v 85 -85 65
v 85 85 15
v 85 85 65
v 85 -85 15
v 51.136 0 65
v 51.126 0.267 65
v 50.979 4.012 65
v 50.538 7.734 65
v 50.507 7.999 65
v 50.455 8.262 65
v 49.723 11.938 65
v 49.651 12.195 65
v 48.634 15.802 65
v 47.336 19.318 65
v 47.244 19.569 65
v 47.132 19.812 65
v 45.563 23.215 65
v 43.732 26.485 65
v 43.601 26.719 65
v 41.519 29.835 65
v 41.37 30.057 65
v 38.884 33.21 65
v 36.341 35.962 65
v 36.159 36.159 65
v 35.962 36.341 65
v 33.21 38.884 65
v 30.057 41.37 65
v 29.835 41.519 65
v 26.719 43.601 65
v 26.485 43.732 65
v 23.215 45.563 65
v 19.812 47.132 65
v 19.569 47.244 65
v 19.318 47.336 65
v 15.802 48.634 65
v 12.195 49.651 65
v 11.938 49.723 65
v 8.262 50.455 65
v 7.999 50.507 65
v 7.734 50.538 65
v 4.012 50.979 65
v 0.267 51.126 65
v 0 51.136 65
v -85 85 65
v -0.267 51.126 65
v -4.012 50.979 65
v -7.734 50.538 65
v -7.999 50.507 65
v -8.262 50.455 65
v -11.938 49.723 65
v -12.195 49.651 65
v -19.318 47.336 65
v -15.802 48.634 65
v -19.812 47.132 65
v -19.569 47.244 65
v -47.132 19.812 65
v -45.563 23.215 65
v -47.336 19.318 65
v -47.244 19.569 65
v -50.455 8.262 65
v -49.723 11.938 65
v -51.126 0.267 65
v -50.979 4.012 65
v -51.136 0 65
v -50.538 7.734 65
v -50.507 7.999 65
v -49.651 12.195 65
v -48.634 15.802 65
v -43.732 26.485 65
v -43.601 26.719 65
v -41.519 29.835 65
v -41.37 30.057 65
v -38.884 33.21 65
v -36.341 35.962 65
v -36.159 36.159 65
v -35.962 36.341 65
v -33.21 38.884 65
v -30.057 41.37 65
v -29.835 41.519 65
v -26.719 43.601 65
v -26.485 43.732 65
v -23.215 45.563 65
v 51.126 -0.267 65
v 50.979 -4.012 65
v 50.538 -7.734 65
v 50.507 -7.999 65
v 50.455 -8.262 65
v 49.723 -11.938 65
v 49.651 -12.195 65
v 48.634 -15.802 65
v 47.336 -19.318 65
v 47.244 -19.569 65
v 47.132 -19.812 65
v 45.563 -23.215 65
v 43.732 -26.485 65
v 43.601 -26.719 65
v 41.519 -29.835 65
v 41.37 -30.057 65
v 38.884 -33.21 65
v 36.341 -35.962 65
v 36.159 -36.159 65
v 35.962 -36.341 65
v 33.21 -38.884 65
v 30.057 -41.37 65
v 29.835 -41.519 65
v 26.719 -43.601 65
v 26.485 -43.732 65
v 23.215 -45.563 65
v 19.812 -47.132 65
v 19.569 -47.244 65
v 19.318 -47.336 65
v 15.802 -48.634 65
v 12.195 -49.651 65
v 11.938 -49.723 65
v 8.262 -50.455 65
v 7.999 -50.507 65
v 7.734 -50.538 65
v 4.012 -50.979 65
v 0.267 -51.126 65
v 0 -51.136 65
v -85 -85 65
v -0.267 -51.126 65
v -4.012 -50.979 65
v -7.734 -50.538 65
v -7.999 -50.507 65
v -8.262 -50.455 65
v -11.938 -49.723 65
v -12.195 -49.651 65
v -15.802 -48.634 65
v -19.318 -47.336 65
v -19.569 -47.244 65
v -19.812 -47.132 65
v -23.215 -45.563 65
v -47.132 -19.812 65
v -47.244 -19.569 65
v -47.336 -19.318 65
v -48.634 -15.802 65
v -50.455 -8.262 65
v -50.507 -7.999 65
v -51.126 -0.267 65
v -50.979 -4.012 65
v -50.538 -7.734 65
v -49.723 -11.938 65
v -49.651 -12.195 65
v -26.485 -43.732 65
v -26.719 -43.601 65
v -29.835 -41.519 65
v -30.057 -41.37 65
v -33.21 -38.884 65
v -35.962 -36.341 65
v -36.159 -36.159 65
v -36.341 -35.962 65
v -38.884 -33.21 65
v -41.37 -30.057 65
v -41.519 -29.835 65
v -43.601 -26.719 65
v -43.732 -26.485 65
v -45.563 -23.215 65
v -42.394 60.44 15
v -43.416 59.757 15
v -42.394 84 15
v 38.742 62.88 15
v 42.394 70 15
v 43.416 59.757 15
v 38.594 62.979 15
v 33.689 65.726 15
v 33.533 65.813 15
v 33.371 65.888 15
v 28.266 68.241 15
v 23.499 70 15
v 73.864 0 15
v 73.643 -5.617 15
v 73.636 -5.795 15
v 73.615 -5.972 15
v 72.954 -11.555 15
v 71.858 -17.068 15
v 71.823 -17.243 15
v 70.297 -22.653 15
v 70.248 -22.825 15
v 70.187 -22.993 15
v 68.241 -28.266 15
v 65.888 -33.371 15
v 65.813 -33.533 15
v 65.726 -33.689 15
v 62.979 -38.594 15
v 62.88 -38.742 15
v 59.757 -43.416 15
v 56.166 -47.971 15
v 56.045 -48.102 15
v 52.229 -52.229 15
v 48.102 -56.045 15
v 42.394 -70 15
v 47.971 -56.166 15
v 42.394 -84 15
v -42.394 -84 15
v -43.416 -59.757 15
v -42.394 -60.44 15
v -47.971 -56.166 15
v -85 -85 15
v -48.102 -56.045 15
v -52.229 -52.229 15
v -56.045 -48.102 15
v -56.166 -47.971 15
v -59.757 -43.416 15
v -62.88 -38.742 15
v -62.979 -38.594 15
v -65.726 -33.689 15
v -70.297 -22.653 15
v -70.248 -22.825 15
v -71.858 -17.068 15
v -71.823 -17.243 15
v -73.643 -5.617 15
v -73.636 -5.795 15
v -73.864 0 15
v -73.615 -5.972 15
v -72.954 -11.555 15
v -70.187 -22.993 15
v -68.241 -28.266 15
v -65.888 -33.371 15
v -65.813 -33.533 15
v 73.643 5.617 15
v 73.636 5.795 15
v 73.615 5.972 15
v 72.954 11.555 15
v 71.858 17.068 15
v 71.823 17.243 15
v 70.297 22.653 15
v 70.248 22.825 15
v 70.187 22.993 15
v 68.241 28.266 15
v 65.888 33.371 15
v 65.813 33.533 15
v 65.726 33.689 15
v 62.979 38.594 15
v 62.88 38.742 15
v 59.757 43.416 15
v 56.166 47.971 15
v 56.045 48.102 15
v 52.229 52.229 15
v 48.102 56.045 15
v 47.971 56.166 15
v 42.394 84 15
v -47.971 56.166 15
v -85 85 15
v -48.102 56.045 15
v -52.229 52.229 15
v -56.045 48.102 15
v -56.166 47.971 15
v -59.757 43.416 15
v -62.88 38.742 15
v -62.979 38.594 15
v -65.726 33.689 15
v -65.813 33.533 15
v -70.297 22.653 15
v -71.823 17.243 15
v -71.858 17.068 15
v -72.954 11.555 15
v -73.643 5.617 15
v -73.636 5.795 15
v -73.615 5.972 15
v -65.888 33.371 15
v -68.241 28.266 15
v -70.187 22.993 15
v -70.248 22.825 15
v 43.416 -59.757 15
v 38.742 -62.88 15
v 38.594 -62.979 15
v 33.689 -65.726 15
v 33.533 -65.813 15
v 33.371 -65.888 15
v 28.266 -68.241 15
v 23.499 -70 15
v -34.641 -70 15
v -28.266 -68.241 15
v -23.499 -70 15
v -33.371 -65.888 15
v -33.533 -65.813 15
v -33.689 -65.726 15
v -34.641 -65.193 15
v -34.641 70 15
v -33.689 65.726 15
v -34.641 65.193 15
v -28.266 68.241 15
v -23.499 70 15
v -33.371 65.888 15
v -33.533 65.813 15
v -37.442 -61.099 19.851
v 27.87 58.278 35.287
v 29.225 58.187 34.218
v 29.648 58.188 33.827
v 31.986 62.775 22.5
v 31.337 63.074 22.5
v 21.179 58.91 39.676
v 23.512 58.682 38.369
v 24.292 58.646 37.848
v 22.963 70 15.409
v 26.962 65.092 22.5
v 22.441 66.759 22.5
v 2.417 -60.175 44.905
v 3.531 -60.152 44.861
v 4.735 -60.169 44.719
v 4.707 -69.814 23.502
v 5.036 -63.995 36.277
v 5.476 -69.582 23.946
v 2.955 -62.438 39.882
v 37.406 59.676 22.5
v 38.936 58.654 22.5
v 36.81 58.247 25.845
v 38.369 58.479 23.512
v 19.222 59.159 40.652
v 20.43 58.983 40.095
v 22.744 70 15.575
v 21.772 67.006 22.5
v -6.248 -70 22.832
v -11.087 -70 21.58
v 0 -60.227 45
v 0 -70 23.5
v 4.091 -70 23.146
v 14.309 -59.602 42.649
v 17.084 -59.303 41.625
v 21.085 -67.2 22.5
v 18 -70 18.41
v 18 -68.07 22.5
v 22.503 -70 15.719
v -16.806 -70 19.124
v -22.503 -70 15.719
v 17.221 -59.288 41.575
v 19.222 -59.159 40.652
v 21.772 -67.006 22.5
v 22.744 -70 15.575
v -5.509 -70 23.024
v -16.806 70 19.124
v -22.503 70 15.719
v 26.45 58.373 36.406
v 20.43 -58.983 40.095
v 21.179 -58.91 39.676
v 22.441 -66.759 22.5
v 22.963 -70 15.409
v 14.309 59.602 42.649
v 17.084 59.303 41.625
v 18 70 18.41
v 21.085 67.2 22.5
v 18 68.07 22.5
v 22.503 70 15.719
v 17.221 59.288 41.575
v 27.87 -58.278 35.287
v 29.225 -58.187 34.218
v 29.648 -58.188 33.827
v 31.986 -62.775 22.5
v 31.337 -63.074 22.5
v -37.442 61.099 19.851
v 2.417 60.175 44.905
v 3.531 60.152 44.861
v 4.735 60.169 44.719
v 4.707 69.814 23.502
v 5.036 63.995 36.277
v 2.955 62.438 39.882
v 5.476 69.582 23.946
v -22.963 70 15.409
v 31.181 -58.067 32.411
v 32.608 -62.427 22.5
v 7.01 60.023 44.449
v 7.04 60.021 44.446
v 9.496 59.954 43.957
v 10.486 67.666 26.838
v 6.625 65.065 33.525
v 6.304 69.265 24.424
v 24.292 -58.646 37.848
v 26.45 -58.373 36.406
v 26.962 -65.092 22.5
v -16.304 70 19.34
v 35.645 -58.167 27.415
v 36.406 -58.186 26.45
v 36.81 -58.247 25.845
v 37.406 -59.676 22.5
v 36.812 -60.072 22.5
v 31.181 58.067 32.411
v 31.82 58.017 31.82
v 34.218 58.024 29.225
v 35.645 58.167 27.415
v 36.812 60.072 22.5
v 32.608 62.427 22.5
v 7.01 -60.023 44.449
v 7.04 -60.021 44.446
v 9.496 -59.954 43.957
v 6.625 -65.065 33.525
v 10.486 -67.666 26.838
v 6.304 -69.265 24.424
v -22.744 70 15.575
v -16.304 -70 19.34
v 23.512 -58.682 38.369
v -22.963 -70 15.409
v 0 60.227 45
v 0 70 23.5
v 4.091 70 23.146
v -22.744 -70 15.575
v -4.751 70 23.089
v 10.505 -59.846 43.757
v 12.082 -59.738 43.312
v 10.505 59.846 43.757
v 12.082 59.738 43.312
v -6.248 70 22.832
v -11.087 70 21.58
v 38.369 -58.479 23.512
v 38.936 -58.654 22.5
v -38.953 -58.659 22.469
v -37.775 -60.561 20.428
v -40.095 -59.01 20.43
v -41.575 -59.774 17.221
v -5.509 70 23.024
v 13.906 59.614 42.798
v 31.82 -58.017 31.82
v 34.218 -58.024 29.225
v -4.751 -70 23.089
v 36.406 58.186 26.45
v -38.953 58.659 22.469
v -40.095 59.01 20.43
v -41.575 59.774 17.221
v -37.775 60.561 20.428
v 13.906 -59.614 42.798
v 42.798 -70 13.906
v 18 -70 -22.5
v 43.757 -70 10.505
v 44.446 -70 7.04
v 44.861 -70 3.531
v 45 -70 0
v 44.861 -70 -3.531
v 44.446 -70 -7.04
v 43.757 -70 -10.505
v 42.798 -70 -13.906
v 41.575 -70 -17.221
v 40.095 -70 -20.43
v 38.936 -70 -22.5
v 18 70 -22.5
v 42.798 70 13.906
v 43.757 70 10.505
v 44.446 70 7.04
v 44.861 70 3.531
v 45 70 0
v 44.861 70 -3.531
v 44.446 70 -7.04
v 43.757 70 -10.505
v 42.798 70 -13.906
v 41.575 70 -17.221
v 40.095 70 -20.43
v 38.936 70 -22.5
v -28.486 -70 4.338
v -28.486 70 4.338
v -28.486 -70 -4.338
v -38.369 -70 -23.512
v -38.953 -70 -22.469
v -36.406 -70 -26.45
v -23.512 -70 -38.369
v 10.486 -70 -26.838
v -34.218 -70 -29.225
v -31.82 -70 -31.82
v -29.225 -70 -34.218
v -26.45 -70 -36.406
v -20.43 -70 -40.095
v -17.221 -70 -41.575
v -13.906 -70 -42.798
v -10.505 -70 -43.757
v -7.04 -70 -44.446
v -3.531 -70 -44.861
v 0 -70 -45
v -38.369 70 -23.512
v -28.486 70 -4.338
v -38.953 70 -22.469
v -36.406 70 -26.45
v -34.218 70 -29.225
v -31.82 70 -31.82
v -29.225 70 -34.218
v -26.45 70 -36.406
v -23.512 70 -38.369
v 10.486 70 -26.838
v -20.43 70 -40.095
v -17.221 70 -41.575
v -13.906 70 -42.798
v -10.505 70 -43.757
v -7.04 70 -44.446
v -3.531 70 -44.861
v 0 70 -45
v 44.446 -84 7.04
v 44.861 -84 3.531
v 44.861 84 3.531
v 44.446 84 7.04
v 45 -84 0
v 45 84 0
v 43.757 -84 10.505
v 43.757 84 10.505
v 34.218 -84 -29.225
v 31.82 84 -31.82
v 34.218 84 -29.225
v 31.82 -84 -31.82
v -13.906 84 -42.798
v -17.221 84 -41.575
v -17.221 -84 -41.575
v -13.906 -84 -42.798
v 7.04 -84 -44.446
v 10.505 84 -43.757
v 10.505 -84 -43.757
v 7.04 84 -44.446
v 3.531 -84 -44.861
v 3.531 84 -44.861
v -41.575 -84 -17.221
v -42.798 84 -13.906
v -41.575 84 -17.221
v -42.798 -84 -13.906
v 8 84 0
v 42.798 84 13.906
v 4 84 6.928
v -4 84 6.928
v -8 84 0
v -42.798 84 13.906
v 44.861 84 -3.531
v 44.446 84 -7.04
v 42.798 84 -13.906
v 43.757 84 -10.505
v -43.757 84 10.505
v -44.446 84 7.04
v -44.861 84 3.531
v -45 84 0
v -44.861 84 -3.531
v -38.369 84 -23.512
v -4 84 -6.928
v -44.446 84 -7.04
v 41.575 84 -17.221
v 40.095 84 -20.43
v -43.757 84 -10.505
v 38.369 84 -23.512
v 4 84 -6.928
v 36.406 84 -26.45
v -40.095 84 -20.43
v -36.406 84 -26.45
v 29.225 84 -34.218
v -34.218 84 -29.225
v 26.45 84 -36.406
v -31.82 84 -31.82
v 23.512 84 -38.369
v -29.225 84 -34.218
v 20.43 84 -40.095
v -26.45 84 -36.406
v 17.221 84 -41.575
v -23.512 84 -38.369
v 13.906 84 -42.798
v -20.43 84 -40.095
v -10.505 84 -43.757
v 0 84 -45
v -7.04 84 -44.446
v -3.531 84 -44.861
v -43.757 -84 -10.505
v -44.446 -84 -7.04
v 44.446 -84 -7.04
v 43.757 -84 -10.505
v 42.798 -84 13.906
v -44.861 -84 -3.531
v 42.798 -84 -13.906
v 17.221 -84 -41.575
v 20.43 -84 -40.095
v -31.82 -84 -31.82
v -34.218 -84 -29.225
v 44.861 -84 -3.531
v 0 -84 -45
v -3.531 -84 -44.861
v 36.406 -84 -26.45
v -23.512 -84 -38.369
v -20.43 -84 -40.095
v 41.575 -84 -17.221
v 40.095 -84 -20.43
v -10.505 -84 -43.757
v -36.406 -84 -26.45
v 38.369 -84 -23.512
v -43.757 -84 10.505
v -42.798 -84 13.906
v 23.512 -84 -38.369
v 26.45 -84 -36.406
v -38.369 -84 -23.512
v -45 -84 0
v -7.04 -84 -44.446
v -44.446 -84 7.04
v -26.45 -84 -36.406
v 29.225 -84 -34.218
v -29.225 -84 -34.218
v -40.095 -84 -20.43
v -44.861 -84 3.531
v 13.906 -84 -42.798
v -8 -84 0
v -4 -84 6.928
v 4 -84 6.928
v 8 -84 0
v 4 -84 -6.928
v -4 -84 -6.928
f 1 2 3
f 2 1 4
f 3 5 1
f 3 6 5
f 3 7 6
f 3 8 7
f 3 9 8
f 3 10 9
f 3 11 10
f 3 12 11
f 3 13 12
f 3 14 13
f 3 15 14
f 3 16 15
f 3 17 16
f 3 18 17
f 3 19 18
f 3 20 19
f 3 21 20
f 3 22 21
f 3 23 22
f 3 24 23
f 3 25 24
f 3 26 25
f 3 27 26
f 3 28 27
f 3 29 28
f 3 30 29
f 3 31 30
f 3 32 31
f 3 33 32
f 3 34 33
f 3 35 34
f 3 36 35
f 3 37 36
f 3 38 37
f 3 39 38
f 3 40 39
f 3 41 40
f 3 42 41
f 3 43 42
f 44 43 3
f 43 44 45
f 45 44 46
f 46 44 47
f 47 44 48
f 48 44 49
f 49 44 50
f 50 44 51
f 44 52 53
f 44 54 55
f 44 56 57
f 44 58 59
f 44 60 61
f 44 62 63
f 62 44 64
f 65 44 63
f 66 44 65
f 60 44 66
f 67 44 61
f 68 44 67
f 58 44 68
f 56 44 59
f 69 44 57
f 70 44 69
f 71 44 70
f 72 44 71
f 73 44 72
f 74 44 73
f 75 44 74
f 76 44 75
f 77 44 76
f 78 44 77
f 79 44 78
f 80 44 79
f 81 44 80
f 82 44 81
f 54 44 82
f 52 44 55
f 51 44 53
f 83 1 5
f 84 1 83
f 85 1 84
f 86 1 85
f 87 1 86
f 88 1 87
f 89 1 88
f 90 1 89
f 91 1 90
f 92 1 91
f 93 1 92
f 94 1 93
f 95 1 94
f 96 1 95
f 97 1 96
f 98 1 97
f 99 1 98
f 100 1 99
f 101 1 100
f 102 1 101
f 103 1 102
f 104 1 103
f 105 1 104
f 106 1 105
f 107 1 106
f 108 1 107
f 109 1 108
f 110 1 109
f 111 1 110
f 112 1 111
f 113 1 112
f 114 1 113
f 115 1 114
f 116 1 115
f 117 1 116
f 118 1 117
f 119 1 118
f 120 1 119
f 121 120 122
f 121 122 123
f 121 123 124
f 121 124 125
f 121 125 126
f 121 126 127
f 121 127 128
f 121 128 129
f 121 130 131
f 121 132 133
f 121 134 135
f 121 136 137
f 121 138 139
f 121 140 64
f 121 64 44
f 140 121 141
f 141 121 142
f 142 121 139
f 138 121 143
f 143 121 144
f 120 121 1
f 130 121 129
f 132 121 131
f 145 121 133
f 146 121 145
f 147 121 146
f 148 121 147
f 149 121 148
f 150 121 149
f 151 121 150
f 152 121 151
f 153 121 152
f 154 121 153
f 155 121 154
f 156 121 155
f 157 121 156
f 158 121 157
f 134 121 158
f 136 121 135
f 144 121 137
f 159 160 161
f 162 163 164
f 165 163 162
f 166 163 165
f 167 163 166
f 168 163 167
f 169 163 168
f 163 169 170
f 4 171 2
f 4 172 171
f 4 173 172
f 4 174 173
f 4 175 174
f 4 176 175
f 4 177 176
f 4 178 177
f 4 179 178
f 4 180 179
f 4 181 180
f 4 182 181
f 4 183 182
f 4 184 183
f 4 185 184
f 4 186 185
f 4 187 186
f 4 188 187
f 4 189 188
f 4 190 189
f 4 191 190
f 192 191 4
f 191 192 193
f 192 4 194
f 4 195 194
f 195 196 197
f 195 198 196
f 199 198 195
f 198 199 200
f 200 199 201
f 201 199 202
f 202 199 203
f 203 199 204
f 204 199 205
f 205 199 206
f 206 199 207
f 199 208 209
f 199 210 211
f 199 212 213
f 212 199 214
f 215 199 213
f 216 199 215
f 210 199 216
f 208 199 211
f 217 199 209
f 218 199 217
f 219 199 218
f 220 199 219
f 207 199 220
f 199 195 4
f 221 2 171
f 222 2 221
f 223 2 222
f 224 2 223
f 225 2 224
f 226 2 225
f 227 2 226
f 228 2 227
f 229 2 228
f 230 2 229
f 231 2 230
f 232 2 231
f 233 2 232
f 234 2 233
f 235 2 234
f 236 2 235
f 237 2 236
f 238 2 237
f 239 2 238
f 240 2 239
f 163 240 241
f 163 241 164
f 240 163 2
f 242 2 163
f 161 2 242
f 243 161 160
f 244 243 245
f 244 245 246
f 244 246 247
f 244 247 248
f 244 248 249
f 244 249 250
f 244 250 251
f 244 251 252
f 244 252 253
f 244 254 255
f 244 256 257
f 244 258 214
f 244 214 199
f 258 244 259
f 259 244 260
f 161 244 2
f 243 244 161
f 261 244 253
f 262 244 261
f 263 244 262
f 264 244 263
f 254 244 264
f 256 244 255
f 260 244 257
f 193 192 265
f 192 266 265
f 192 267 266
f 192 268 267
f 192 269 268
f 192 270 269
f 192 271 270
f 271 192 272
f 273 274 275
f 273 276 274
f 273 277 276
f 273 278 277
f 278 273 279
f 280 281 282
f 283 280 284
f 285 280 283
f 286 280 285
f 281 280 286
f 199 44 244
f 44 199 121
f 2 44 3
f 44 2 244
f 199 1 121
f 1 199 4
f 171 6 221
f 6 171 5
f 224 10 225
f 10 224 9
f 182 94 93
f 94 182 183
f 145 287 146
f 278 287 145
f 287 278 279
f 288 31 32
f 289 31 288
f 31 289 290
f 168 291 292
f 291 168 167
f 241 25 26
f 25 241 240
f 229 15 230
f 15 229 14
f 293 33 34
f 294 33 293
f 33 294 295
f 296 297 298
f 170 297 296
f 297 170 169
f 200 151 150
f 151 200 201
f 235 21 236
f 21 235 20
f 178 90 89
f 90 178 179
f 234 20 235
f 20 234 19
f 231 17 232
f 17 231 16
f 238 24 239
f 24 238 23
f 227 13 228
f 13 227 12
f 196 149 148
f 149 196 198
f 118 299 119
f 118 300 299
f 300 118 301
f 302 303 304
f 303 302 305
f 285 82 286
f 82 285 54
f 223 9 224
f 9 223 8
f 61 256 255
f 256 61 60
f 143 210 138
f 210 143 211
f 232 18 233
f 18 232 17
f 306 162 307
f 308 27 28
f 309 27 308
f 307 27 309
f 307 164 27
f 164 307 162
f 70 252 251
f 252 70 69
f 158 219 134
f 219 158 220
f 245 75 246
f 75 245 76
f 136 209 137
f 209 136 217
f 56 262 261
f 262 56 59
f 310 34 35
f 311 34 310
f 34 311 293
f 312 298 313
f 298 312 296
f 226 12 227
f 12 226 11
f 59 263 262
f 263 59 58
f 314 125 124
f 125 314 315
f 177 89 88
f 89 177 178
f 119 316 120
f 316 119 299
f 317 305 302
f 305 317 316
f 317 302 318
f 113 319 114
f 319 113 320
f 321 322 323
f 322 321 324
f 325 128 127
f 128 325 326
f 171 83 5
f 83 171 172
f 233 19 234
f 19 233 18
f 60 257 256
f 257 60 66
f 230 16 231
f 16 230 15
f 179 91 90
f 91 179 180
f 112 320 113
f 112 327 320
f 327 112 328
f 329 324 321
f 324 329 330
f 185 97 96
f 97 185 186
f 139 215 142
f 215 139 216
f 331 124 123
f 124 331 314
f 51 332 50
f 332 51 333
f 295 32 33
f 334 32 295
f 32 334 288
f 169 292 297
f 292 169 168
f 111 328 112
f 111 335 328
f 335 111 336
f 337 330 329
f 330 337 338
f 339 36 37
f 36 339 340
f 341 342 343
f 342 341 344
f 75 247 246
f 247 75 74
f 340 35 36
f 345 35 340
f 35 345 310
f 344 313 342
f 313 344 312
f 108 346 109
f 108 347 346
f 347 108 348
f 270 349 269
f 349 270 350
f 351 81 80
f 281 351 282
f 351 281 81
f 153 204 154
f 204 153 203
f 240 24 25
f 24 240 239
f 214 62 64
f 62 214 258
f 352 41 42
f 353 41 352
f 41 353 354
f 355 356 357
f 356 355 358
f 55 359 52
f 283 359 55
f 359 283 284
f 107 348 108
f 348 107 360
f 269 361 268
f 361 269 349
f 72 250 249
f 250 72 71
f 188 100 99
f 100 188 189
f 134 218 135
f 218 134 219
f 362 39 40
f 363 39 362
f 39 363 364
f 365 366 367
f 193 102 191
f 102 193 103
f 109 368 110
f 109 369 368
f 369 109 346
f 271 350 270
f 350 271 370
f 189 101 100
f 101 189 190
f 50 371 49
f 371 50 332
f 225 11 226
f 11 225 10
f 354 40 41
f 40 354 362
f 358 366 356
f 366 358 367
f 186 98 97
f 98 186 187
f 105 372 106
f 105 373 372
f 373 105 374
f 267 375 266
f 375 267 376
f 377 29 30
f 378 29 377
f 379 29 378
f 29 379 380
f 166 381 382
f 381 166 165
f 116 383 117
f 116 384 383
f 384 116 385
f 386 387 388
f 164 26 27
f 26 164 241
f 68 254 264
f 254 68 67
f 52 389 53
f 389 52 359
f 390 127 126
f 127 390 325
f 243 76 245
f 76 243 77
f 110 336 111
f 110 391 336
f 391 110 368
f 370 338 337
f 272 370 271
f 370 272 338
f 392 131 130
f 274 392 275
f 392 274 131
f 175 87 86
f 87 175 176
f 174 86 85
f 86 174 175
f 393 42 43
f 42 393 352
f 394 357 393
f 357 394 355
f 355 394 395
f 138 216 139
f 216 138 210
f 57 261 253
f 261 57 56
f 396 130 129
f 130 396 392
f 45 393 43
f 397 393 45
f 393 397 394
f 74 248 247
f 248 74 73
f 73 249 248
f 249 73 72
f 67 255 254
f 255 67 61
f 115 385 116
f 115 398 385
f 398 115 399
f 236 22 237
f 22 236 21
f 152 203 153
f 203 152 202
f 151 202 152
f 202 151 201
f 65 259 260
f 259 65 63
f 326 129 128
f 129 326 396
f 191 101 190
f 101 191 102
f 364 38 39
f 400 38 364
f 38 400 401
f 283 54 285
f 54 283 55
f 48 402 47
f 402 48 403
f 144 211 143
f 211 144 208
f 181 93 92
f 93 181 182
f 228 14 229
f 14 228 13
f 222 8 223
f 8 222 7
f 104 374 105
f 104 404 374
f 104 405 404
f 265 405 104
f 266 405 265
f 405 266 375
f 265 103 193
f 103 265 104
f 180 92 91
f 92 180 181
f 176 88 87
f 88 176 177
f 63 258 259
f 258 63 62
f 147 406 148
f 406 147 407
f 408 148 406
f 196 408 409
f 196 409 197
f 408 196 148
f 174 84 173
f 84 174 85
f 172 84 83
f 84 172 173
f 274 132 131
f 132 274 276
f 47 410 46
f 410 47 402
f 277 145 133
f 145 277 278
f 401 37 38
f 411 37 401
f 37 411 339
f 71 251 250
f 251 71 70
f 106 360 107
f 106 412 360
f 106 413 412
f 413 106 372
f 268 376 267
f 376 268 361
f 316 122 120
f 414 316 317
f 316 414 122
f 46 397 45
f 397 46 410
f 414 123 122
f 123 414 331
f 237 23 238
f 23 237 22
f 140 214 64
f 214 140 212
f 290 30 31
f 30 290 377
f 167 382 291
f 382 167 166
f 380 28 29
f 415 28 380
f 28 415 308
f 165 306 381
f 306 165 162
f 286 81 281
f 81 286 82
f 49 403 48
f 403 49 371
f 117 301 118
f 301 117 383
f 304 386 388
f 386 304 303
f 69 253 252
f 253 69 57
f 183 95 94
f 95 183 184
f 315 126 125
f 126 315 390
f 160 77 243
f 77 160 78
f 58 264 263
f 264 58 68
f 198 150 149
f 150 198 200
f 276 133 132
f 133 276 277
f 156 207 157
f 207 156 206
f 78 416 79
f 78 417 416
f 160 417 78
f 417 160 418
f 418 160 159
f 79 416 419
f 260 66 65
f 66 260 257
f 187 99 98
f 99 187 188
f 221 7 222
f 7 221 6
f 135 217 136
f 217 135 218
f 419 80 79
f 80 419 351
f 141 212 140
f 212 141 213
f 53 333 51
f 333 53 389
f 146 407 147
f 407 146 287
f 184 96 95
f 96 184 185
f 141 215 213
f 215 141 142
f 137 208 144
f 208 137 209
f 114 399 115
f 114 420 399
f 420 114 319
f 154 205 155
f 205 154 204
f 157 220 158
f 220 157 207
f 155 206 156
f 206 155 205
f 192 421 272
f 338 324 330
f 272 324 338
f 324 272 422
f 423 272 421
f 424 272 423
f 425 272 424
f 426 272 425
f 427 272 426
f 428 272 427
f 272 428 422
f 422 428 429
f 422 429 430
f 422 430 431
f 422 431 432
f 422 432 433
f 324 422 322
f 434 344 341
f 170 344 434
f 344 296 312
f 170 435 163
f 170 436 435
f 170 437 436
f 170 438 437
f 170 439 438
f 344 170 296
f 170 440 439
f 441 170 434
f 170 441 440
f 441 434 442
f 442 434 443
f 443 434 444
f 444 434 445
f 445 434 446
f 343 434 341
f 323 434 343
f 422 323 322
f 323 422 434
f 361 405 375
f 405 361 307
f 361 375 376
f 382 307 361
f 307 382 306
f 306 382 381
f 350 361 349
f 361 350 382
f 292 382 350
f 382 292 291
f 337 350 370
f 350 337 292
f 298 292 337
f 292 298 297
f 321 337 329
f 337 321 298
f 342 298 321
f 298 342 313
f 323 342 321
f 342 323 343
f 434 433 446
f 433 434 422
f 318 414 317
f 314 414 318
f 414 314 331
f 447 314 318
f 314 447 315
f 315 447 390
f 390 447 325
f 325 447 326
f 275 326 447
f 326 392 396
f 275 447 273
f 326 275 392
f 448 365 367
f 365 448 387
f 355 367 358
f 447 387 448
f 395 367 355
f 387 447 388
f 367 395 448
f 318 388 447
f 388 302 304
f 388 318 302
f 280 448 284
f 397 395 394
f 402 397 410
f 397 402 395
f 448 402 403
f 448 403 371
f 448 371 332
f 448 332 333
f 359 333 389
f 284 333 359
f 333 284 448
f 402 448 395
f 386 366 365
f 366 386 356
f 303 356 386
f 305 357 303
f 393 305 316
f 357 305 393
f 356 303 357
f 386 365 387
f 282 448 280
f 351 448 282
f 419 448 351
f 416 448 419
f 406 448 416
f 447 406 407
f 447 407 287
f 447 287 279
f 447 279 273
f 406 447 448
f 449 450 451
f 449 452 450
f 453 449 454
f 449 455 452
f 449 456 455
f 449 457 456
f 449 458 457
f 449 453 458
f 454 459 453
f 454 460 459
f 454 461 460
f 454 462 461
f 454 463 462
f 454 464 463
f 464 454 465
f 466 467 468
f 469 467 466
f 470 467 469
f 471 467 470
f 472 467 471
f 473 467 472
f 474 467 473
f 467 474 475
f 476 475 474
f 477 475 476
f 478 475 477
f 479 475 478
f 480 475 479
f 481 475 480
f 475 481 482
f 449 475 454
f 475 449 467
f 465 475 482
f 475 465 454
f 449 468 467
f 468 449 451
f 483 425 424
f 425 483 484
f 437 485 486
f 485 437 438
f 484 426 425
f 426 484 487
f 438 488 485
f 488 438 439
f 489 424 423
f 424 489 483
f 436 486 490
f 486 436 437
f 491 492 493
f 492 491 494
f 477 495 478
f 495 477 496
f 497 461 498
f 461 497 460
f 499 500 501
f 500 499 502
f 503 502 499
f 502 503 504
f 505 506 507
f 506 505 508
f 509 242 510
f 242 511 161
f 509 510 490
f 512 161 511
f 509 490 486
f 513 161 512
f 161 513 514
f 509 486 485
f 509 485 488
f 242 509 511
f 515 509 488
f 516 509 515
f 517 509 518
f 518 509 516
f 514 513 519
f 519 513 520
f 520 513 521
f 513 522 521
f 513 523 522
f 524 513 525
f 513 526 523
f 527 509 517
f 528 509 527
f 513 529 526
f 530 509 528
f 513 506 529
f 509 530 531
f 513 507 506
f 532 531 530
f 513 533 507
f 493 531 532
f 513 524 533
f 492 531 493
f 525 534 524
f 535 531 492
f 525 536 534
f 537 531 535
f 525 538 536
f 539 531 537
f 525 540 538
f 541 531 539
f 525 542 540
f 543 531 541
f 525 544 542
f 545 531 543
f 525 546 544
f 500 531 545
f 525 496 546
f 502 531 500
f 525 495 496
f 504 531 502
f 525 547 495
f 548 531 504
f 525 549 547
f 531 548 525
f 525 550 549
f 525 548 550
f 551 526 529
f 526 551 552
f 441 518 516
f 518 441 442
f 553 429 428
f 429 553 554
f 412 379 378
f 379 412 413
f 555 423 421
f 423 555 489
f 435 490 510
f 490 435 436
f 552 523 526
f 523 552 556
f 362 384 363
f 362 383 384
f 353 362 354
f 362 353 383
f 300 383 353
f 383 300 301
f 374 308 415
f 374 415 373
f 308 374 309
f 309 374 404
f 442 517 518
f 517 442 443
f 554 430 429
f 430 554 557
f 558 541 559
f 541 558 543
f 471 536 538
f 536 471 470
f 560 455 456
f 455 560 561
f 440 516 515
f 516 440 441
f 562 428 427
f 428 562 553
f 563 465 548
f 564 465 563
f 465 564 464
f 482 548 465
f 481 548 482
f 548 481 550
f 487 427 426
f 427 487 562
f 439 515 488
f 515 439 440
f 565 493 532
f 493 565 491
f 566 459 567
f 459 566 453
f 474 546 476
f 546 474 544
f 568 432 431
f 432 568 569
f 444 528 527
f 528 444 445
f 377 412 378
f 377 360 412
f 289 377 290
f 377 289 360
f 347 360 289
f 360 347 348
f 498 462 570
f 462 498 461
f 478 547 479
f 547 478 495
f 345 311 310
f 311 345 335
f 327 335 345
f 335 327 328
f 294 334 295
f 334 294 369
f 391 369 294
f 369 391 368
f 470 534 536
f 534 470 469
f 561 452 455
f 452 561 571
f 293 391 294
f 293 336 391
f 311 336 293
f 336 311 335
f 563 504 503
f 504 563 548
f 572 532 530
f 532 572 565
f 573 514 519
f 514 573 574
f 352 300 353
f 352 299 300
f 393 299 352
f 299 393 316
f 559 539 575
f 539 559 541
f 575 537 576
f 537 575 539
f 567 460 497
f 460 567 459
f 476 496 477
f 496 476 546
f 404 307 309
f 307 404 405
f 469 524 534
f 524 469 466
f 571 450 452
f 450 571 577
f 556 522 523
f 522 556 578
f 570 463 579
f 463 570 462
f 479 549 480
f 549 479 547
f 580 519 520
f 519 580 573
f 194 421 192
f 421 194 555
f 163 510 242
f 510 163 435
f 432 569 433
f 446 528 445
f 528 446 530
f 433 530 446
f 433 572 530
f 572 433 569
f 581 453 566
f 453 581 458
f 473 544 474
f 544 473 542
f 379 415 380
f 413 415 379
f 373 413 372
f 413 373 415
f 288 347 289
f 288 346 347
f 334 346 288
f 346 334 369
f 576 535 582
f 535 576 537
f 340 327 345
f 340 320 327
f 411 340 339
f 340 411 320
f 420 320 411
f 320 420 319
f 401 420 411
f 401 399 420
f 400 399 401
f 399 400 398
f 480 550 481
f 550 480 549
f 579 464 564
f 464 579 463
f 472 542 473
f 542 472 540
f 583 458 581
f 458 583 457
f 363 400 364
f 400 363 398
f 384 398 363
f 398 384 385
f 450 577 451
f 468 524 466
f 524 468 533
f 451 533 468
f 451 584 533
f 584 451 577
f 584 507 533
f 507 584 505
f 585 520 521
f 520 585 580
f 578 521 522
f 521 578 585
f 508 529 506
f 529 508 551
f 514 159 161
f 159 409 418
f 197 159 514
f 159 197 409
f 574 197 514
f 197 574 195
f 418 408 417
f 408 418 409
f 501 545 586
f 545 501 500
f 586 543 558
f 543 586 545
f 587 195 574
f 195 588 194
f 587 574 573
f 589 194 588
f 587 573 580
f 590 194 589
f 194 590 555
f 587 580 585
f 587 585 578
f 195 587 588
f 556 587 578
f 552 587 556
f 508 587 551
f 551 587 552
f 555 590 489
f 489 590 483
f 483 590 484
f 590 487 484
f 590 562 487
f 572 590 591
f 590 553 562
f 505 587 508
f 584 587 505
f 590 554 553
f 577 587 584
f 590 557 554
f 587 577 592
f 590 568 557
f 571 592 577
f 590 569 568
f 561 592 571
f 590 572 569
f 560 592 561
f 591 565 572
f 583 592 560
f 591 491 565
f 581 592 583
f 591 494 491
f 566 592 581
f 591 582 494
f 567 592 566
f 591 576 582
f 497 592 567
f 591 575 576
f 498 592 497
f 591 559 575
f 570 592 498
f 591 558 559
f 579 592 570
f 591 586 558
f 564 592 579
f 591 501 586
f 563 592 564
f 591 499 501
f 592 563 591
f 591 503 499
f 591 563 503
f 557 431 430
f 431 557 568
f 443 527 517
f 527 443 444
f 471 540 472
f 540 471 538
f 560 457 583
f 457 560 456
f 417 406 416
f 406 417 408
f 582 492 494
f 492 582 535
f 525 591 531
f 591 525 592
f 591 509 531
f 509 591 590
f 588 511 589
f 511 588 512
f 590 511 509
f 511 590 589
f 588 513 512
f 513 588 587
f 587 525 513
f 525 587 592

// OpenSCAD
// UNIVAC IX Smart Farm Mechanical Device: Rotary Hopper Metering Valve
// Fits standard 45-degree wood hopper chutes (NDSU Beef/Poultry blueprints)

$fn = 80;
chute_width = 150;
valve_radius = 45;

module hopper_chute_adapter() {
    difference() {
        // Outer housing flanged to mount onto a wooden hopper box base
        cube([chute_width + 20, chute_width + 20, 50], center=true);
        // Internal funneling taper
        cylinder(h=55, r1=chute_width/2, r2=chute_width/3, center=true);
    }
}

module rotary_drum_valve() {
    // Continuous rotation drum with precise volume pockets
    difference() {
        cylinder(h=chute_width + 18, r=valve_radius, center=true);
        // Hexagonal drive shaft slot for the motor interface
        cylinder(h=chute_width + 30, r=8, center=true, $fn=6);
        // Metering volumetric pockets (Rotated 120 degrees apart)
        for(r=[0, 120, 240]) {
            rotate([0, 0, r]) translate([valve_radius - 12, 0, 0]) 
                cube([30, valve_radius, chute_width - 10], center=true);
        }
    }
}

// Visual rendering layout
color("SaddleBrown") translate([0, 0, 40]) hopper_chute_adapter();
color("LightSteelBlue") rotate([90, 0, 0]) rotary_drum_valve();
